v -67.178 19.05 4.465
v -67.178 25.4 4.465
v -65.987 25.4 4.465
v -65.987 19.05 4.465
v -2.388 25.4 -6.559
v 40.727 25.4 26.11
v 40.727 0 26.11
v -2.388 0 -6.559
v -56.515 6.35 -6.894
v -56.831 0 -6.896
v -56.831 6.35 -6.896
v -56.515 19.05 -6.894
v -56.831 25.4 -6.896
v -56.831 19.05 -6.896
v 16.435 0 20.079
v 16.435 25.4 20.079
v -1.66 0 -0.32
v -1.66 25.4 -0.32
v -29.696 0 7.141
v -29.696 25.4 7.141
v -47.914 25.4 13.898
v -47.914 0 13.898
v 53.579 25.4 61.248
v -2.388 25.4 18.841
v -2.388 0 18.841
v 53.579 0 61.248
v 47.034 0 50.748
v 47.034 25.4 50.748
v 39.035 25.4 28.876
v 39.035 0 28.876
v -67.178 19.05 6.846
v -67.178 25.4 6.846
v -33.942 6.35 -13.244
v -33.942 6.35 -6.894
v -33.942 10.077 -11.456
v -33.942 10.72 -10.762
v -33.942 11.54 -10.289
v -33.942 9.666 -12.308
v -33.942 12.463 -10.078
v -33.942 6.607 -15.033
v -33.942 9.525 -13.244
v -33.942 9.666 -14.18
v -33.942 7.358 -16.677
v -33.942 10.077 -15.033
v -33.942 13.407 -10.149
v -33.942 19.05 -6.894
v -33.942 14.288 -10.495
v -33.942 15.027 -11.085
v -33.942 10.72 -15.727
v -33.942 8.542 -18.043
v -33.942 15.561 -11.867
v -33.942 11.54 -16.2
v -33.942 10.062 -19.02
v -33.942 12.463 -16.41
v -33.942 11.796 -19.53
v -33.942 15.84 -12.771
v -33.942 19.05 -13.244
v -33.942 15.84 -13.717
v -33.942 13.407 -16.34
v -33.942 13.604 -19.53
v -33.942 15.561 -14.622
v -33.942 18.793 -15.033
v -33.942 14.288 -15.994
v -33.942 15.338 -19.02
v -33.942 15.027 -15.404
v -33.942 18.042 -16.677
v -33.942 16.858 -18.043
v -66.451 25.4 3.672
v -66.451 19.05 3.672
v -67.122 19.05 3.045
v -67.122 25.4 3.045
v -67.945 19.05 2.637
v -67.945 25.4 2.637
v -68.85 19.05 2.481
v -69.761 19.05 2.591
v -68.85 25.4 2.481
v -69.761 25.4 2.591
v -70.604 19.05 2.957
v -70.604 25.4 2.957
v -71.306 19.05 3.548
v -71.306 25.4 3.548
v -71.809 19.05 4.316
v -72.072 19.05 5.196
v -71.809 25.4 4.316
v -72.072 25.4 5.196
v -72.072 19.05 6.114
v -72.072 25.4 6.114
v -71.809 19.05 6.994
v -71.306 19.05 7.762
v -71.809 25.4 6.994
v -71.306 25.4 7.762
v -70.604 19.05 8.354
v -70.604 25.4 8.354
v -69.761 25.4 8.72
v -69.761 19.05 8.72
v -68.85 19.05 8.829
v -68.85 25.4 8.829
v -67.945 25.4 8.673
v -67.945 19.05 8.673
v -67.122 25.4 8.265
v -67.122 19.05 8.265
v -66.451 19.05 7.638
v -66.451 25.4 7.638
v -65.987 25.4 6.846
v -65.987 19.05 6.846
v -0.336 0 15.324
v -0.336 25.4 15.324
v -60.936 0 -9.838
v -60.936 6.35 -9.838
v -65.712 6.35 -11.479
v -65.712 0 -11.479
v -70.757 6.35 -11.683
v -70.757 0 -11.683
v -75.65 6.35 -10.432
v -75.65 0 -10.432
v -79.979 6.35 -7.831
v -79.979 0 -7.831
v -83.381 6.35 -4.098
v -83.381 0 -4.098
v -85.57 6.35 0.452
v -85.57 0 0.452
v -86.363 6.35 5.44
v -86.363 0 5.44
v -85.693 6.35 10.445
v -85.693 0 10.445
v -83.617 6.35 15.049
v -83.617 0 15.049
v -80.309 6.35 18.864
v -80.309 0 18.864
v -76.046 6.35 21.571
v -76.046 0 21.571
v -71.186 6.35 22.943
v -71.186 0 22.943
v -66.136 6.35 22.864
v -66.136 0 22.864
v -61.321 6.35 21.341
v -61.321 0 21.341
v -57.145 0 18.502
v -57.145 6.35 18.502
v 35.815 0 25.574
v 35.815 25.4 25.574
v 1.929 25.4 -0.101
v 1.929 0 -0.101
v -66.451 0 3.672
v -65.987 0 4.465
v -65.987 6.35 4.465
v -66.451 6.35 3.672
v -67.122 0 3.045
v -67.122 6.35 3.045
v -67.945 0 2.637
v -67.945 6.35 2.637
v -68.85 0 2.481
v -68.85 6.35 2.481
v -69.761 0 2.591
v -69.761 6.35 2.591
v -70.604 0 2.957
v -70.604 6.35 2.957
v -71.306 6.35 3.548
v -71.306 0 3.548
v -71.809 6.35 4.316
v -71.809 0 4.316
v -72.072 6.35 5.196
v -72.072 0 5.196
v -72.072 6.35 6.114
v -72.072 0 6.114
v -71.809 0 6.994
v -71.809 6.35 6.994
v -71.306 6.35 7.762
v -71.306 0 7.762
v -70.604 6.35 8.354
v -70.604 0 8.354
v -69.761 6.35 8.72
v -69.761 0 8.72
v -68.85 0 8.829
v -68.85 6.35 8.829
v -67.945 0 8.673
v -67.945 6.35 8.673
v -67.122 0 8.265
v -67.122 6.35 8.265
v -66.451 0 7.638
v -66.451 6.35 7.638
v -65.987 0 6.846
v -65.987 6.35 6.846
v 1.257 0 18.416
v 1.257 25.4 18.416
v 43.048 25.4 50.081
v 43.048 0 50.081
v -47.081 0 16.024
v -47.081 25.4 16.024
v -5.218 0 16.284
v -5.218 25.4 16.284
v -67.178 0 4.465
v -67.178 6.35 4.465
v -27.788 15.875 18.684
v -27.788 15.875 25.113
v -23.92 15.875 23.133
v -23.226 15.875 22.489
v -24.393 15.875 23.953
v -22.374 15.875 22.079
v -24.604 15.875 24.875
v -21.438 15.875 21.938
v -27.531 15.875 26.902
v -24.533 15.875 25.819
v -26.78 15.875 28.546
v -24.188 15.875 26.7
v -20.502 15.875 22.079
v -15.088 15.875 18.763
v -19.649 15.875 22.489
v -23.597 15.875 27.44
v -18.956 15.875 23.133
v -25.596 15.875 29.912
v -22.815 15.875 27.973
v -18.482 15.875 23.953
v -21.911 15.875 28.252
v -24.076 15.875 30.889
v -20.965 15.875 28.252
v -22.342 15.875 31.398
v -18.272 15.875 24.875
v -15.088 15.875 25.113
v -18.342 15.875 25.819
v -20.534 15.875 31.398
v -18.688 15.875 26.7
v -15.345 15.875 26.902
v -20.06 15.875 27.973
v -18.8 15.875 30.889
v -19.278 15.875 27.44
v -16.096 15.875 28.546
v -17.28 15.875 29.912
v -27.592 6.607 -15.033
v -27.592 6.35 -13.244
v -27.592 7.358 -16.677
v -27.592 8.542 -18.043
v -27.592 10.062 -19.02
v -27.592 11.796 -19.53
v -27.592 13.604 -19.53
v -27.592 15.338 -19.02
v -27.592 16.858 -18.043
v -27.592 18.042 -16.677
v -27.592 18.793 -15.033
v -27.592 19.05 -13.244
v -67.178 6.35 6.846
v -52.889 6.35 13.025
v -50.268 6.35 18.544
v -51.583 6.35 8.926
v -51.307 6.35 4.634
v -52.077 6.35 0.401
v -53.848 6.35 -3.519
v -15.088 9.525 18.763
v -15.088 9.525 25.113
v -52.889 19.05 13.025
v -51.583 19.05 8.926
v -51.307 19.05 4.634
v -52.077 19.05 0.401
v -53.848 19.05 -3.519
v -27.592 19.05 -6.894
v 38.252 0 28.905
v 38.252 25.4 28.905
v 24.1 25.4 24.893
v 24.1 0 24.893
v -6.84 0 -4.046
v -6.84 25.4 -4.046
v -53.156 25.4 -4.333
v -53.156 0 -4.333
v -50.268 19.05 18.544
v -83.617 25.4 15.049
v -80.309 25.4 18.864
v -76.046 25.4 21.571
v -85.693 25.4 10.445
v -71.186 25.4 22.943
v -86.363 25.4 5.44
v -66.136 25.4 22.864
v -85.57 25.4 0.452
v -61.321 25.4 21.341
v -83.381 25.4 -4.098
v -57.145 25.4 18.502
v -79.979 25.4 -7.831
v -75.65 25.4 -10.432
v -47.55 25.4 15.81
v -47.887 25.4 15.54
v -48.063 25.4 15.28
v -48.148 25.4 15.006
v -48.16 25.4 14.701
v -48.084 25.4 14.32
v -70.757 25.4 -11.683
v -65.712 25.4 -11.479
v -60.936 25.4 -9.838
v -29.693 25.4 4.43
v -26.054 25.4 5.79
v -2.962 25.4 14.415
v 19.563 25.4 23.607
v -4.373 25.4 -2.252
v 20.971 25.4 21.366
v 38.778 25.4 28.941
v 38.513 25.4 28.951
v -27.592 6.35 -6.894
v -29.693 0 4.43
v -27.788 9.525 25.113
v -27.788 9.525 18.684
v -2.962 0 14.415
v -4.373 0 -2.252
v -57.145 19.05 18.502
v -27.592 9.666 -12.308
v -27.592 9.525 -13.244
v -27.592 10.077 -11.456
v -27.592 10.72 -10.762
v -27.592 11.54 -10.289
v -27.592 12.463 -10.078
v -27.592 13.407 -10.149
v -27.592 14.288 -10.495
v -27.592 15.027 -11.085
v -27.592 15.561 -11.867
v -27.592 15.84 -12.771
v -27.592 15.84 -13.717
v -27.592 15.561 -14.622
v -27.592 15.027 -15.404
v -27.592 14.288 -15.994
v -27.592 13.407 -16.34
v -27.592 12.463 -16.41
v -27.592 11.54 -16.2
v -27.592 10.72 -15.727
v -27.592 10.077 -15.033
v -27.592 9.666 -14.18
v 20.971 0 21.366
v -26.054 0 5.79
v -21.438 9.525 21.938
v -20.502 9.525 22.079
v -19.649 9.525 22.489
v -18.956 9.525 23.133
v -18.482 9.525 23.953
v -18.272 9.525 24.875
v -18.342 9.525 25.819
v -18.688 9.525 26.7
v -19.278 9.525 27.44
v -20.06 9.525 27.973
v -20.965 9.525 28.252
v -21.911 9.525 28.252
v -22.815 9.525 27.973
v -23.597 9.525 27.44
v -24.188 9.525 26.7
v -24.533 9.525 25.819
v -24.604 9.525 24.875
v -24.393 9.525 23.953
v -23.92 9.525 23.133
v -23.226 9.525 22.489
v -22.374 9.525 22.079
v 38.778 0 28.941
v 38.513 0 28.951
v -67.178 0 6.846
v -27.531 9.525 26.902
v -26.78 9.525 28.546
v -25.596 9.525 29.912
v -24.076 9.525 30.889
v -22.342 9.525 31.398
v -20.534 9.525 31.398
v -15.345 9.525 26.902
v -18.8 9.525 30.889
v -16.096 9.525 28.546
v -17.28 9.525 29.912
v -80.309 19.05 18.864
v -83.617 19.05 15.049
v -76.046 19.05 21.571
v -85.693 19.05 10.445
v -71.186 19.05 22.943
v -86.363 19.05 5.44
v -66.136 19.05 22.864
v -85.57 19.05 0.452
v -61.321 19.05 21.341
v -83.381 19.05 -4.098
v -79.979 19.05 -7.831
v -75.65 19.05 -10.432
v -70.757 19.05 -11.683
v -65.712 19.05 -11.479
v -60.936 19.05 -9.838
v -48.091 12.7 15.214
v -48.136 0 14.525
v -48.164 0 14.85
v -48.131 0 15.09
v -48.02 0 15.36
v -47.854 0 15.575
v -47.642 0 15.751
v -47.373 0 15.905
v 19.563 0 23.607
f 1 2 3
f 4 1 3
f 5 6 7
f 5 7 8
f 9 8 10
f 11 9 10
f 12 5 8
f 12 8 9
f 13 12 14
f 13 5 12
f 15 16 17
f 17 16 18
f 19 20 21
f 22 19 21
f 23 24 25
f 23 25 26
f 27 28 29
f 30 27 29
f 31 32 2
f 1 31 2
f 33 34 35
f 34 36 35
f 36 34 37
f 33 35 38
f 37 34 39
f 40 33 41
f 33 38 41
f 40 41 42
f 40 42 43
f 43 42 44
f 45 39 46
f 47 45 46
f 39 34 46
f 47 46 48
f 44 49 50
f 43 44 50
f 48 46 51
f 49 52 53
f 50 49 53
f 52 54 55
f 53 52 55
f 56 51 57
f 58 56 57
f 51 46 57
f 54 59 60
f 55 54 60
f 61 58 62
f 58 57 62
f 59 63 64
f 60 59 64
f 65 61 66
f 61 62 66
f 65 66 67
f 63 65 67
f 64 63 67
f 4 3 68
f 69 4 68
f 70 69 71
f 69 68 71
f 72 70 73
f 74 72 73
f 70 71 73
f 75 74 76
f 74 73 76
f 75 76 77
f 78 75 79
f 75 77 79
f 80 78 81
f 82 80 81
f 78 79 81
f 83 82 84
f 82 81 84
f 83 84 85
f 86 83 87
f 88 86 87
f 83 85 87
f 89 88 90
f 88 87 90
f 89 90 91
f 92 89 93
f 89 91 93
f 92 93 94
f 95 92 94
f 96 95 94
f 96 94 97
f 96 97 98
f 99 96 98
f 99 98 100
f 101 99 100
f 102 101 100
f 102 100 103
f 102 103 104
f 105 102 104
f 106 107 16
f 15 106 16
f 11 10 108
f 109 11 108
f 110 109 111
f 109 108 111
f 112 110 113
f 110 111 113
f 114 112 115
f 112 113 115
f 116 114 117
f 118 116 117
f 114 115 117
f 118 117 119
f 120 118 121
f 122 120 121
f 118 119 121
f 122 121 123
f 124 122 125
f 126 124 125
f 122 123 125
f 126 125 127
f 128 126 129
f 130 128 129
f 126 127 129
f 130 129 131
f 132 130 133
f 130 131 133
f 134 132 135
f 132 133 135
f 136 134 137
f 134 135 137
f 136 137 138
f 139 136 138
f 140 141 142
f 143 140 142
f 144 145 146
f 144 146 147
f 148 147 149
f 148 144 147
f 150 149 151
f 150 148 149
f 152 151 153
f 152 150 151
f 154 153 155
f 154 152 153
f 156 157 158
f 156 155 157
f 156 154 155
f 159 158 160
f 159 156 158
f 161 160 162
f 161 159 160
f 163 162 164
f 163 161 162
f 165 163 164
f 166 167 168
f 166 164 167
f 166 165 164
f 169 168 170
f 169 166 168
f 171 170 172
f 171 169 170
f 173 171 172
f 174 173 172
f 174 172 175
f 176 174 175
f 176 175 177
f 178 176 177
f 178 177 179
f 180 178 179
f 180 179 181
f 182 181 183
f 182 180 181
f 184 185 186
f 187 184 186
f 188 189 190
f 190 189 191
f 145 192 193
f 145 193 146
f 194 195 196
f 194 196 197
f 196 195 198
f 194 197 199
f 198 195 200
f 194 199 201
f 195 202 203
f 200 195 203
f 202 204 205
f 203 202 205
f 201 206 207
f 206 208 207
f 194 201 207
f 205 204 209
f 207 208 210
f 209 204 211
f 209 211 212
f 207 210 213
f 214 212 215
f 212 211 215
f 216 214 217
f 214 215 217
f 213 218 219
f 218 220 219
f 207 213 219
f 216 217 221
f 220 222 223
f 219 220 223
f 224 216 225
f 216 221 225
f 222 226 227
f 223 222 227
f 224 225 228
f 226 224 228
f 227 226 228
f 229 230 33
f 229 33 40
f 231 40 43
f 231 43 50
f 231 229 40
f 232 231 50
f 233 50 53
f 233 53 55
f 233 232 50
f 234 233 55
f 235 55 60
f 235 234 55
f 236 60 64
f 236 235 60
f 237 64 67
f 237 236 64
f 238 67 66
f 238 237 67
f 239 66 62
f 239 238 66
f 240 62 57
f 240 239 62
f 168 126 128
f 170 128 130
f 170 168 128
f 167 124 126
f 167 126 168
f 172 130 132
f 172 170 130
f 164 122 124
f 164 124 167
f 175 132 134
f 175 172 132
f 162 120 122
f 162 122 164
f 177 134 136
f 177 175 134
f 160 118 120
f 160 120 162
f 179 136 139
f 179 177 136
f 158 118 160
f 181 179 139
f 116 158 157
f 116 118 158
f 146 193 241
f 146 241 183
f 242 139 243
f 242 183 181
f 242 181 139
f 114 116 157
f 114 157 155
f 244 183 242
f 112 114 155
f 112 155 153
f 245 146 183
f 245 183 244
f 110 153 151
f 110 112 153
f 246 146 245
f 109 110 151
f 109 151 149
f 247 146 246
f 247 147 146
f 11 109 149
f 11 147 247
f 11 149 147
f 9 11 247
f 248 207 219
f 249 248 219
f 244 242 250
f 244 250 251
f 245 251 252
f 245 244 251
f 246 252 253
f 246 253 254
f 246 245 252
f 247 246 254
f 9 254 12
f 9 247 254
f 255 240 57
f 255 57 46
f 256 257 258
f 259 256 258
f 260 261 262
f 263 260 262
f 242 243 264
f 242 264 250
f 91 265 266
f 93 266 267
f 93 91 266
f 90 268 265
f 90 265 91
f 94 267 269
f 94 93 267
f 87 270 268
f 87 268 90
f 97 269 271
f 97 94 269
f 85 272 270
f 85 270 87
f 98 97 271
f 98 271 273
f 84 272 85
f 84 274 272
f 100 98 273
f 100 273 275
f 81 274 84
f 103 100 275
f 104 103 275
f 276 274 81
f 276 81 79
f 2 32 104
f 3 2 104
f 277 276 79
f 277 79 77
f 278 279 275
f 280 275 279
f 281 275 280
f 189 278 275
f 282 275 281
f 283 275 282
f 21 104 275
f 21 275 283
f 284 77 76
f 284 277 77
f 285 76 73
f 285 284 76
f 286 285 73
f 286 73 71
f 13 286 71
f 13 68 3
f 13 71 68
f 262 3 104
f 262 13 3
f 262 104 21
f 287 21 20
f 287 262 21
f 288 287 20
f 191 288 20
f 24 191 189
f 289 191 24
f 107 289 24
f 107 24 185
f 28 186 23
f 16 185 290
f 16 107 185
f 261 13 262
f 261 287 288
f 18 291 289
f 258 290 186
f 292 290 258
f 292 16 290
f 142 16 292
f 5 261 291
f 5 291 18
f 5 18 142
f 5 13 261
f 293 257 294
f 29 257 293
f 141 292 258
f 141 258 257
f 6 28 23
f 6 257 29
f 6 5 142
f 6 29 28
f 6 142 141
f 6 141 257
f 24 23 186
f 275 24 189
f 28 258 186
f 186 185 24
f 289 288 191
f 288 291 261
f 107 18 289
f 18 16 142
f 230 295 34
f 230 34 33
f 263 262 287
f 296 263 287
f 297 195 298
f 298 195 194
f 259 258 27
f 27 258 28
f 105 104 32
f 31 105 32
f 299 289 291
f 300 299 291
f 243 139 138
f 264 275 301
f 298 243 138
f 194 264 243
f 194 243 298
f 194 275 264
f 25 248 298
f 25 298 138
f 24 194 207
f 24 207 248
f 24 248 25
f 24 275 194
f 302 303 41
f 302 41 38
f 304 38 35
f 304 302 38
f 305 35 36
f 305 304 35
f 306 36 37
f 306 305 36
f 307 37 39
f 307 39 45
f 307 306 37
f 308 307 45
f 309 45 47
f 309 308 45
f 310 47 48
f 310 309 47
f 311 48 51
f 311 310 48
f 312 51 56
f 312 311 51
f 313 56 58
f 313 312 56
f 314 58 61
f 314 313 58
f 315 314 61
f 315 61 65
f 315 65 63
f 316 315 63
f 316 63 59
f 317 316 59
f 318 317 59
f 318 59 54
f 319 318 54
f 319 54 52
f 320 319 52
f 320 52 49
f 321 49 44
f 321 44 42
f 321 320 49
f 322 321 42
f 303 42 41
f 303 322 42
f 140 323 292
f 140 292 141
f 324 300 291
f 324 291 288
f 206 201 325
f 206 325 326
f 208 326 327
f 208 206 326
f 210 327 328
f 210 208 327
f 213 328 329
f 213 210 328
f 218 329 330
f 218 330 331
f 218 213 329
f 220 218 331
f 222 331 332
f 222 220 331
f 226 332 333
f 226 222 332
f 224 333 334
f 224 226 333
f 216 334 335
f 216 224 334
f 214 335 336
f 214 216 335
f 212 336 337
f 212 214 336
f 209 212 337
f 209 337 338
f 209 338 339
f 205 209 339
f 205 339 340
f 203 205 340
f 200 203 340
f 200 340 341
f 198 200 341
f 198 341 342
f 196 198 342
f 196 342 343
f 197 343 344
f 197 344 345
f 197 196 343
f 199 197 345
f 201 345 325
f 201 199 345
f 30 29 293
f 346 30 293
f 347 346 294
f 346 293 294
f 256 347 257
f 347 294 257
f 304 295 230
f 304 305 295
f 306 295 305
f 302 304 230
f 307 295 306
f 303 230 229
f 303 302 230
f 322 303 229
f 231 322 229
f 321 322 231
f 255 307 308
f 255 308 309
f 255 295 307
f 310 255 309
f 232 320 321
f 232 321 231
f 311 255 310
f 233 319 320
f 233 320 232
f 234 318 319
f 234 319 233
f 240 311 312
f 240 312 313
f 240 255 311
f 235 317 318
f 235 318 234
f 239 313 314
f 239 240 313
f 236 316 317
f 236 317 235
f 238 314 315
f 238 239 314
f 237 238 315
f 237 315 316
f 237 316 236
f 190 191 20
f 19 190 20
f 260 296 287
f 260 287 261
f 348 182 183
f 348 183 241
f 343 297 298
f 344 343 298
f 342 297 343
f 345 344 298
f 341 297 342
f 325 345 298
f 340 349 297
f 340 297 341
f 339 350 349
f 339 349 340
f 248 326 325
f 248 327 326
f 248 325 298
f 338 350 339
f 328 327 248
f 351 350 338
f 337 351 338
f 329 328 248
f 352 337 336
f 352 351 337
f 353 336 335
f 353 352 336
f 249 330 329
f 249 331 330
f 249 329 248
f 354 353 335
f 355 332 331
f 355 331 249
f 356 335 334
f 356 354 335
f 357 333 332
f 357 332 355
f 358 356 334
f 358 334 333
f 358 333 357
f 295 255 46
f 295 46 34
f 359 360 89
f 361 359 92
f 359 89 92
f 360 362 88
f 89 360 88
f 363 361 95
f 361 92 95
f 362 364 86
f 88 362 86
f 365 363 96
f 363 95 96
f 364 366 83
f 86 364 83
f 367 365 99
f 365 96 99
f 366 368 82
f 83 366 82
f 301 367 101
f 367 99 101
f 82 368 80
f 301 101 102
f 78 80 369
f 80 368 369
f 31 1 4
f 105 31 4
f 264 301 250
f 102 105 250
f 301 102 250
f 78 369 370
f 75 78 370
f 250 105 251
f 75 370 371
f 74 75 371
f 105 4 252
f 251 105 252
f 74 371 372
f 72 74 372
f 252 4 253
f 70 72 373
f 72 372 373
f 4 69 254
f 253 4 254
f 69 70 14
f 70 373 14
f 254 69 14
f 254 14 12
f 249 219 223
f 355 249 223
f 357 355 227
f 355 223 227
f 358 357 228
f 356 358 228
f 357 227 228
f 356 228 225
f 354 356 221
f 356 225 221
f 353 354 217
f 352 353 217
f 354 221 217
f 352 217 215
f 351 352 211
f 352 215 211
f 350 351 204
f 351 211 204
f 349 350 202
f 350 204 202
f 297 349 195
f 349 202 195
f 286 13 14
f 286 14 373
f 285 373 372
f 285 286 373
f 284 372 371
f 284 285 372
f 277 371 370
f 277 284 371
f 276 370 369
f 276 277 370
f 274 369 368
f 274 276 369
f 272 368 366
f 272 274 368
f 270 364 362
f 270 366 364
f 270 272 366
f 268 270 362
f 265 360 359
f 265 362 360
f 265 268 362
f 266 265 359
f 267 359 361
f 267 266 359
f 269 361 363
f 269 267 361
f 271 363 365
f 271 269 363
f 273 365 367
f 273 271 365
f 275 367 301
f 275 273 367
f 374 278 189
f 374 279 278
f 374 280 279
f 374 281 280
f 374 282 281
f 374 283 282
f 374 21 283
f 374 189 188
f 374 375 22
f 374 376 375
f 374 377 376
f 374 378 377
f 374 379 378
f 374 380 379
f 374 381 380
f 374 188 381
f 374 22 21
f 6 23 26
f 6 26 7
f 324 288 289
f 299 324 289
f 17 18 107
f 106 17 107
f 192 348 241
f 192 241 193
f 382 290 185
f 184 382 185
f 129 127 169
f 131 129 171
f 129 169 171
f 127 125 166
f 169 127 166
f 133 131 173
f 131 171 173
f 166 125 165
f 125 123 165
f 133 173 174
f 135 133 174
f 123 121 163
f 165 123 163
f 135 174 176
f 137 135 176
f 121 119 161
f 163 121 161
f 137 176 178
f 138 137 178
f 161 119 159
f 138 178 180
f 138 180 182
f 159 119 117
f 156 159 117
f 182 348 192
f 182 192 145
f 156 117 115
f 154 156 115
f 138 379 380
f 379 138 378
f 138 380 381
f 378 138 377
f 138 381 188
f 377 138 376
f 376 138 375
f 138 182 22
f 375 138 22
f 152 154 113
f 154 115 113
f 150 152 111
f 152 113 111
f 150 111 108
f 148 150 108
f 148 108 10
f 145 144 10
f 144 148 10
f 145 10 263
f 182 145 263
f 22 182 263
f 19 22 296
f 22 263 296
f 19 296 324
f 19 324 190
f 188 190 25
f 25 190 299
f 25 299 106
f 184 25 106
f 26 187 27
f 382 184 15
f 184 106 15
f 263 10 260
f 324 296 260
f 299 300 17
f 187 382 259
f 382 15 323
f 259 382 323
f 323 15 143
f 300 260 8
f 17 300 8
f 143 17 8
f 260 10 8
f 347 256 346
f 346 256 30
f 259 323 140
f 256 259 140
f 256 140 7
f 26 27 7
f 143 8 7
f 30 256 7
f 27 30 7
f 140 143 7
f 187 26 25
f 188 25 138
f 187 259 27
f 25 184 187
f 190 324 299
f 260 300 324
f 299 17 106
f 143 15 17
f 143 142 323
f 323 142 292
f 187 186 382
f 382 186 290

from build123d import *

# Parameters (mm, degrees)
BOSS_EXTRUDE4_DEPTH      = 12.7
SKETCH4_R                = 17.653445752
CUT_EXTRUDE1_DEPTH       = 6.35
CUT_EXTRUDE2_DEPTH       = 6.35
CUT_EXTRUDE5_DEPTH       = 109.881733746
BOSS_EXTRUDE6_DEPTH      = 3.175
BOSS_EXTRUDE6_DEPTH_BACK = 3.175
SKETCH9_R                = 3.175
BOSS_EXTRUDE7_DEPTH      = 3.175
BOSS_EXTRUDE7_DEPTH_BACK = 3.175
SKETCH10_R               = 3.175


with BuildPart() as part:
    # Sketch2 → Boss-Extrude4 (new body)
    with BuildSketch(Plane(origin=(0, 0, 0), x_dir=(1, 0, 0), z_dir=(0, 1, 0))):
        with BuildLine():
            Line((-2.387880417, -18.841306965), (53.578976921, -61.247629626))
            Line((53.578976921, -61.247629626), (40.727486813, -26.109986808))
            Line((40.727486813, -26.109986808), (-2.387867851, 6.558698348))
            Line((-2.387867851, 6.558698348), (-56.830809788, 6.896210087))
            ThreePointArc((-56.830809788, 6.896210087), (-86.36301081, -5.439598854), (-57.144853521, -18.501848432))
            Line((-57.144853521, -18.501848432), (-2.387880417, -18.841306965))
        make_face()
        with BuildLine():
            Line((-65.987192171, -6.845774662), (-67.177817171, -6.845774662))
            Line((-67.177817171, -6.845774662), (-67.177817171, -4.464524662))
            Line((-67.177817171, -4.464524662), (-65.987192171, -4.464524662))
            ThreePointArc((-65.987192171, -4.464524662), (-72.105495945, -5.655149662), (-65.987192171, -6.845774662))
        make_face(mode=Mode.SUBTRACT)
    boss_extrude4 = extrude(amount=BOSS_EXTRUDE4_DEPTH)

    # Sketch4 → Cut-Extrude1 (cut)
    with BuildSketch(Plane(origin=(0, 12.7, 0), x_dir=(1, 0, 0), z_dir=(0, 1, 0))):
        with Locations((-68.930495945, -5.655149662)):
            Circle(SKETCH4_R)
    cut_extrude1 = extrude(amount=-CUT_EXTRUDE1_DEPTH, mode=Mode.SUBTRACT)

    # Triangleout → Cut-Extrude2 (cut)
    with BuildSketch(Plane(origin=(0, 6.35, 0), x_dir=(1, 0, 0), z_dir=(0, 1, 0))):
        Polygon((-58.106305107, -19.510345754), (-49.809105951, -19.510345754), (-52.888981235, -13.024949709), align=None)
    cut_extrude2 = extrude(amount=CUT_EXTRUDE2_DEPTH, mode=Mode.SUBTRACT)

    # Mirror3: Boss-Extrude4, Cut-Extrude1, Cut-Extrude2 across plane
    add(boss_extrude4.mirror(Plane(origin=(-68.930495945, 12.7, 5.655149662), x_dir=(0, 0, 1), z_dir=(0, -1, 0))))
    add(cut_extrude1.mirror(Plane(origin=(-68.930495945, 12.7, 5.655149662), x_dir=(0, 0, 1), z_dir=(0, -1, 0))), mode=Mode.SUBTRACT)
    add(cut_extrude2.mirror(Plane(origin=(-68.930495945, 12.7, 5.655149662), x_dir=(0, 0, 1), z_dir=(0, -1, 0))), mode=Mode.SUBTRACT)

    # Sketch5 → Cut-Extrude5 (cut, through all)
    with BuildSketch(Plane(origin=(0, 25.4, 0), x_dir=(1, 0, 0), z_dir=(0, 1, 0))):
        with BuildLine():
            Line((24.099631315, -24.892755187), (47.034088631, -50.747669189))
            Line((47.034088631, -50.747669189), (39.03471101, -28.876331991))
            ThreePointArc((39.03471101, -28.876331991), (38.645676848, -28.952727466), (38.252042628, -28.905441646))
            Line((38.252042628, -28.905441646), (24.099631315, -24.892755187))
        make_face()
        Polygon((1.256640277, -18.415995941), (43.047568139, -50.081157351), (19.563456511, -23.606596468), align=None)
        Polygon((-0.335913055, -15.324329604), (16.434626788, -20.079343901), (-1.660316127, 0.319795544), align=None)
        Polygon((1.929156818, 0.100890993), (20.970801592, -21.365502621), (35.814534972, -25.574202228), align=None)
        with BuildLine():
            Line((-47.081442632, -16.024186394), (-5.218084554, -16.283712685))
            Line((-5.218084554, -16.283712685), (-29.69599423, -7.140722356))
            Line((-29.69599423, -7.140722356), (-47.914378424, -13.898443659))
            add(Edge.make_bspline(
                [(-47.081442632, -16.024186394), (-48.684668247, -15.466043094), (-47.914378424, -13.898443659)],
                knots=[0, 0, 0, 1, 1, 1], degree=2))
        make_face()
        Polygon((-26.05383136, -5.78973967), (-2.9619803, -14.4150093), (-4.373004357, 2.252300993), align=None)
        Polygon((-29.692909923, -4.430470821), (-6.840209692, 4.046251237), (-53.155770657, 4.333378365), align=None)
    extrude(amount=-CUT_EXTRUDE5_DEPTH, mode=Mode.SUBTRACT)

    # Sketch10 → Boss-Extrude7 (add, two sides: drawn at the far end of the back side and taken through both)
    with BuildSketch(Plane.XZ.offset(-12.7).offset(-BOSS_EXTRUDE7_DEPTH_BACK)):
        with BuildLine():
            Line((-27.787880417, 18.683843062), (-15.087880417, 18.762575013))
            Line((-15.087880417, 18.762575013), (-15.087880417, 25.112575013))
            ThreePointArc((-15.087880417, 25.112575013), (-21.437880417, 31.462575013), (-27.787880417, 25.112575013))
            Line((-27.787880417, 25.112575013), (-27.787880417, 18.683843062))
        make_face()
        with Locations((-21.437880417, 25.112575013)):
            Circle(SKETCH10_R, mode=Mode.SUBTRACT)
    extrude(amount=BOSS_EXTRUDE7_DEPTH + BOSS_EXTRUDE7_DEPTH_BACK)


with BuildPart() as body_2:
    # Sketch9 → Boss-Extrude6 (new, two sides: drawn at the far end of the back side and taken through both)
    with BuildSketch(Plane.ZY.offset(30.767363181).offset(-BOSS_EXTRUDE6_DEPTH_BACK)):
        with BuildLine():
            Line((-13.244249221, 19.05), (-6.894249221, 19.05))
            Line((-6.894249221, 19.05), (-6.894249221, 6.35))
            Line((-6.894249221, 6.35), (-13.244249221, 6.35))
            ThreePointArc((-13.244249221, 6.35), (-19.594249221, 12.7), (-13.244249221, 19.05))
        make_face()
        with Locations((-13.244249221, 12.7)):
            Circle(SKETCH9_R, mode=Mode.SUBTRACT)
    extrude(amount=BOSS_EXTRUDE6_DEPTH + BOSS_EXTRUDE6_DEPTH_BACK)


solid = Compound([part.part, body_2.part])
